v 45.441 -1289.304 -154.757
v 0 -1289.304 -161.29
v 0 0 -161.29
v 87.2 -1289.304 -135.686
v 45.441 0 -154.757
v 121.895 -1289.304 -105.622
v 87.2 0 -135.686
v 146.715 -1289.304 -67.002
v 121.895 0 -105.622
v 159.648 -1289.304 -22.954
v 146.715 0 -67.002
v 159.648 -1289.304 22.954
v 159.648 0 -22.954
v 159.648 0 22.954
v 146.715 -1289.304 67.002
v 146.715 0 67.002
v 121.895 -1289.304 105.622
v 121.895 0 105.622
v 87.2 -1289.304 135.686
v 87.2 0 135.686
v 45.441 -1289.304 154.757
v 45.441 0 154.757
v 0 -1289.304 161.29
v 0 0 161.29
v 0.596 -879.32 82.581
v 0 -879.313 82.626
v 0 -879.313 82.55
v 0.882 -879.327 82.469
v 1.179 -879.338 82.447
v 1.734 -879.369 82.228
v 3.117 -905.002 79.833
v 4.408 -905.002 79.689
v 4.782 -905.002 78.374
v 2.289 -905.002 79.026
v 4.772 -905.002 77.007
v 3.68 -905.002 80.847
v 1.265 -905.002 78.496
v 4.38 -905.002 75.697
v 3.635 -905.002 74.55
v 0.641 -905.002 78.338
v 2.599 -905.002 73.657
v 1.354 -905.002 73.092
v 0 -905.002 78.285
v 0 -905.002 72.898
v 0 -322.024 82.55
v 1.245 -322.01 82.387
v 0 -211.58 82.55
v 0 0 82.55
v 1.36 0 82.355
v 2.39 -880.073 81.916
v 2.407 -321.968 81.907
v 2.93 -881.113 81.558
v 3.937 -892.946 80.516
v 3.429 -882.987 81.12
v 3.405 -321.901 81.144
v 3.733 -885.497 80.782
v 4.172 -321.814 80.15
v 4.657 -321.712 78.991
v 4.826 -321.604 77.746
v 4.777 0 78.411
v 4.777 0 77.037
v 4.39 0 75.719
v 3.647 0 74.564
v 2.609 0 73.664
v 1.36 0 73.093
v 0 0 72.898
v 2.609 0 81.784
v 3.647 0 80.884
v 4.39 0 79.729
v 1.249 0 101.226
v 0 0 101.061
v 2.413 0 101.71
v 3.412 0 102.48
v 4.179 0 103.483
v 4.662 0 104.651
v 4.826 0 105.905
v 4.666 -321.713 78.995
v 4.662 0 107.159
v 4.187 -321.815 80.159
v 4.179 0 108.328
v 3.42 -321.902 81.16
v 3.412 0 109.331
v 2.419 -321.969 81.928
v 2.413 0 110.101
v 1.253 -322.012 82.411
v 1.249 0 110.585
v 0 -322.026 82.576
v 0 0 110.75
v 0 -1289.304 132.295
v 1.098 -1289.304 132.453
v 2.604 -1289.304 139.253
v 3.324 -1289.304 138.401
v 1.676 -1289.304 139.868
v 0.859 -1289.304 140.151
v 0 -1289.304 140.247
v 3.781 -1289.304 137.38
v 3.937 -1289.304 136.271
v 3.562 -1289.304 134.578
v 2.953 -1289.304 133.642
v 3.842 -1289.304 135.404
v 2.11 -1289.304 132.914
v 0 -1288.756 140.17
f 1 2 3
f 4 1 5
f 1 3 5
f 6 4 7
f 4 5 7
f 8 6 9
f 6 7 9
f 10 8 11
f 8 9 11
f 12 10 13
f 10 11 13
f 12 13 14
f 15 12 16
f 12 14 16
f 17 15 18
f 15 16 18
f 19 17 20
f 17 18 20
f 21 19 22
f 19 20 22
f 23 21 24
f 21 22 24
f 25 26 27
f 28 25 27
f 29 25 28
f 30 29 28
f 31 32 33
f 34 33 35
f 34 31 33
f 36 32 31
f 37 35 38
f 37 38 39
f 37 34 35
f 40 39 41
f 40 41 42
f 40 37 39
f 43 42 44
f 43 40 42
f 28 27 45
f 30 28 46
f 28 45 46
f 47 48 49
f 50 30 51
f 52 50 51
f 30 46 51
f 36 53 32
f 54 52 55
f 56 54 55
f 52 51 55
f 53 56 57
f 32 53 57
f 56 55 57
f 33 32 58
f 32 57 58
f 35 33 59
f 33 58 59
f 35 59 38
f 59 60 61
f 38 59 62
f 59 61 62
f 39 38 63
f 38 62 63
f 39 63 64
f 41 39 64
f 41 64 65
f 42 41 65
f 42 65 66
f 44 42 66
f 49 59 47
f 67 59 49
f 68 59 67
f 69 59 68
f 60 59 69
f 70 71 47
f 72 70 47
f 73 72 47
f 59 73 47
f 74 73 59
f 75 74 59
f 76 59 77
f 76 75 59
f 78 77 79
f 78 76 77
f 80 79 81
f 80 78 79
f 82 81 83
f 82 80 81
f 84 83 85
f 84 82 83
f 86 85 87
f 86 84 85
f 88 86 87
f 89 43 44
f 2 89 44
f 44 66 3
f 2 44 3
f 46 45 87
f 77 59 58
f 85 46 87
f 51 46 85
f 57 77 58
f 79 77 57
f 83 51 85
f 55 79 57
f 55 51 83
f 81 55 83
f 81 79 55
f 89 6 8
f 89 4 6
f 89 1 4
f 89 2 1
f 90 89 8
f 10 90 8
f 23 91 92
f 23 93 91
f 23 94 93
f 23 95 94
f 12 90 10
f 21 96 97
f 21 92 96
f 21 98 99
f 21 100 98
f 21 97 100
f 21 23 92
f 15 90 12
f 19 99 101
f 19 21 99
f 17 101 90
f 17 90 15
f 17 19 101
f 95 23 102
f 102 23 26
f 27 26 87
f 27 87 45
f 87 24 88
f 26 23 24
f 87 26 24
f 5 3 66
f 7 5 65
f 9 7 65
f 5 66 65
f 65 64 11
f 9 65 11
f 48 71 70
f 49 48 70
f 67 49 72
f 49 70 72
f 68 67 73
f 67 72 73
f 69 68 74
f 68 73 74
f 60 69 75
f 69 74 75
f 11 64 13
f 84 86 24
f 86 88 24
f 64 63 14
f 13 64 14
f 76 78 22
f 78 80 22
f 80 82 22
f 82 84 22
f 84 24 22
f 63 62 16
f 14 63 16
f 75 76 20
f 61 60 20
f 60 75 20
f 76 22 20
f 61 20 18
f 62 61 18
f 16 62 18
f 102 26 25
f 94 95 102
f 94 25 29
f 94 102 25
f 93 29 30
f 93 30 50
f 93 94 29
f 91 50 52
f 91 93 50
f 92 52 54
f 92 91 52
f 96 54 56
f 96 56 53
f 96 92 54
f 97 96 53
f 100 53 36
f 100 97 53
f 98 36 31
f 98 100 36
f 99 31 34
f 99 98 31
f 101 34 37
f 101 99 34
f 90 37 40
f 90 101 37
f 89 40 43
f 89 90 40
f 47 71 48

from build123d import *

# Parameters (mm, degrees)
F0_R     = 161.29
F1_DEPTH = 1289.304
F2_R     = 4.826
F3_DEPTH = 905.002
F8_DEPTH = 1323.34


with BuildPart() as f1:
    # F0 (on Front) → F1 (new body)
    with BuildSketch(Plane.XZ):
        Circle(F0_R)
    extrude(amount=F1_DEPTH)

    # F2 (on face) → F3 (cut)
    with BuildSketch(Plane(origin=(0, 0, 0), x_dir=(-1, 0, 0), z_dir=(0, 1, 0))):
        with Locations((0, 77.724)):
            Circle(F2_R)
    extrude(amount=-F3_DEPTH, mode=Mode.SUBTRACT)

    # F4 (on Right) → F5 (revolve, cut)
    with BuildSketch(Plane.YZ):
        Polygon((-1291.5896564596, 140.5679192197), (-1289.304, 136.271), (-879.3132141796, 78.6505527405), (-879.3132141796, 82.6262438935), (-1288.7560755015, 140.1696853866), align=None)
    revolve(axis=Axis((0, -1084.3086070898, 107.4607763703), (0, 0.9902680687, -0.139173101)), mode=Mode.SUBTRACT)

    # F7 (on face) → F8 (cut)
    with BuildSketch(Plane(origin=(0, 0, 0), x_dir=(-1, 0, 0), z_dir=(0, 1, 0))):
        Polygon((88.3945971727, 168.1389510632), (0, 174.1231227369), (0, -186.8681758642), (195.7223266363, -99.0545749664), (195.7223266363, 72.0693692565), align=None)
    extrude(amount=-F8_DEPTH, mode=Mode.SUBTRACT)

    # F6 (on Right) → F9 (revolve, cut)
    with BuildSketch(Plane.YZ):
        Polygon((36.6785619574, 104.2698238297), (36.2579483429, 109.0774594427), (-321.6055191638, 77.7684629458), (-321.1849055493, 72.9608273328), align=None)
    revolve(axis=Axis((0, -142.6737854104, 93.4229611943), (0, -0.9961946981, -0.0871557427)), mode=Mode.SUBTRACT)


solid = f1.part
